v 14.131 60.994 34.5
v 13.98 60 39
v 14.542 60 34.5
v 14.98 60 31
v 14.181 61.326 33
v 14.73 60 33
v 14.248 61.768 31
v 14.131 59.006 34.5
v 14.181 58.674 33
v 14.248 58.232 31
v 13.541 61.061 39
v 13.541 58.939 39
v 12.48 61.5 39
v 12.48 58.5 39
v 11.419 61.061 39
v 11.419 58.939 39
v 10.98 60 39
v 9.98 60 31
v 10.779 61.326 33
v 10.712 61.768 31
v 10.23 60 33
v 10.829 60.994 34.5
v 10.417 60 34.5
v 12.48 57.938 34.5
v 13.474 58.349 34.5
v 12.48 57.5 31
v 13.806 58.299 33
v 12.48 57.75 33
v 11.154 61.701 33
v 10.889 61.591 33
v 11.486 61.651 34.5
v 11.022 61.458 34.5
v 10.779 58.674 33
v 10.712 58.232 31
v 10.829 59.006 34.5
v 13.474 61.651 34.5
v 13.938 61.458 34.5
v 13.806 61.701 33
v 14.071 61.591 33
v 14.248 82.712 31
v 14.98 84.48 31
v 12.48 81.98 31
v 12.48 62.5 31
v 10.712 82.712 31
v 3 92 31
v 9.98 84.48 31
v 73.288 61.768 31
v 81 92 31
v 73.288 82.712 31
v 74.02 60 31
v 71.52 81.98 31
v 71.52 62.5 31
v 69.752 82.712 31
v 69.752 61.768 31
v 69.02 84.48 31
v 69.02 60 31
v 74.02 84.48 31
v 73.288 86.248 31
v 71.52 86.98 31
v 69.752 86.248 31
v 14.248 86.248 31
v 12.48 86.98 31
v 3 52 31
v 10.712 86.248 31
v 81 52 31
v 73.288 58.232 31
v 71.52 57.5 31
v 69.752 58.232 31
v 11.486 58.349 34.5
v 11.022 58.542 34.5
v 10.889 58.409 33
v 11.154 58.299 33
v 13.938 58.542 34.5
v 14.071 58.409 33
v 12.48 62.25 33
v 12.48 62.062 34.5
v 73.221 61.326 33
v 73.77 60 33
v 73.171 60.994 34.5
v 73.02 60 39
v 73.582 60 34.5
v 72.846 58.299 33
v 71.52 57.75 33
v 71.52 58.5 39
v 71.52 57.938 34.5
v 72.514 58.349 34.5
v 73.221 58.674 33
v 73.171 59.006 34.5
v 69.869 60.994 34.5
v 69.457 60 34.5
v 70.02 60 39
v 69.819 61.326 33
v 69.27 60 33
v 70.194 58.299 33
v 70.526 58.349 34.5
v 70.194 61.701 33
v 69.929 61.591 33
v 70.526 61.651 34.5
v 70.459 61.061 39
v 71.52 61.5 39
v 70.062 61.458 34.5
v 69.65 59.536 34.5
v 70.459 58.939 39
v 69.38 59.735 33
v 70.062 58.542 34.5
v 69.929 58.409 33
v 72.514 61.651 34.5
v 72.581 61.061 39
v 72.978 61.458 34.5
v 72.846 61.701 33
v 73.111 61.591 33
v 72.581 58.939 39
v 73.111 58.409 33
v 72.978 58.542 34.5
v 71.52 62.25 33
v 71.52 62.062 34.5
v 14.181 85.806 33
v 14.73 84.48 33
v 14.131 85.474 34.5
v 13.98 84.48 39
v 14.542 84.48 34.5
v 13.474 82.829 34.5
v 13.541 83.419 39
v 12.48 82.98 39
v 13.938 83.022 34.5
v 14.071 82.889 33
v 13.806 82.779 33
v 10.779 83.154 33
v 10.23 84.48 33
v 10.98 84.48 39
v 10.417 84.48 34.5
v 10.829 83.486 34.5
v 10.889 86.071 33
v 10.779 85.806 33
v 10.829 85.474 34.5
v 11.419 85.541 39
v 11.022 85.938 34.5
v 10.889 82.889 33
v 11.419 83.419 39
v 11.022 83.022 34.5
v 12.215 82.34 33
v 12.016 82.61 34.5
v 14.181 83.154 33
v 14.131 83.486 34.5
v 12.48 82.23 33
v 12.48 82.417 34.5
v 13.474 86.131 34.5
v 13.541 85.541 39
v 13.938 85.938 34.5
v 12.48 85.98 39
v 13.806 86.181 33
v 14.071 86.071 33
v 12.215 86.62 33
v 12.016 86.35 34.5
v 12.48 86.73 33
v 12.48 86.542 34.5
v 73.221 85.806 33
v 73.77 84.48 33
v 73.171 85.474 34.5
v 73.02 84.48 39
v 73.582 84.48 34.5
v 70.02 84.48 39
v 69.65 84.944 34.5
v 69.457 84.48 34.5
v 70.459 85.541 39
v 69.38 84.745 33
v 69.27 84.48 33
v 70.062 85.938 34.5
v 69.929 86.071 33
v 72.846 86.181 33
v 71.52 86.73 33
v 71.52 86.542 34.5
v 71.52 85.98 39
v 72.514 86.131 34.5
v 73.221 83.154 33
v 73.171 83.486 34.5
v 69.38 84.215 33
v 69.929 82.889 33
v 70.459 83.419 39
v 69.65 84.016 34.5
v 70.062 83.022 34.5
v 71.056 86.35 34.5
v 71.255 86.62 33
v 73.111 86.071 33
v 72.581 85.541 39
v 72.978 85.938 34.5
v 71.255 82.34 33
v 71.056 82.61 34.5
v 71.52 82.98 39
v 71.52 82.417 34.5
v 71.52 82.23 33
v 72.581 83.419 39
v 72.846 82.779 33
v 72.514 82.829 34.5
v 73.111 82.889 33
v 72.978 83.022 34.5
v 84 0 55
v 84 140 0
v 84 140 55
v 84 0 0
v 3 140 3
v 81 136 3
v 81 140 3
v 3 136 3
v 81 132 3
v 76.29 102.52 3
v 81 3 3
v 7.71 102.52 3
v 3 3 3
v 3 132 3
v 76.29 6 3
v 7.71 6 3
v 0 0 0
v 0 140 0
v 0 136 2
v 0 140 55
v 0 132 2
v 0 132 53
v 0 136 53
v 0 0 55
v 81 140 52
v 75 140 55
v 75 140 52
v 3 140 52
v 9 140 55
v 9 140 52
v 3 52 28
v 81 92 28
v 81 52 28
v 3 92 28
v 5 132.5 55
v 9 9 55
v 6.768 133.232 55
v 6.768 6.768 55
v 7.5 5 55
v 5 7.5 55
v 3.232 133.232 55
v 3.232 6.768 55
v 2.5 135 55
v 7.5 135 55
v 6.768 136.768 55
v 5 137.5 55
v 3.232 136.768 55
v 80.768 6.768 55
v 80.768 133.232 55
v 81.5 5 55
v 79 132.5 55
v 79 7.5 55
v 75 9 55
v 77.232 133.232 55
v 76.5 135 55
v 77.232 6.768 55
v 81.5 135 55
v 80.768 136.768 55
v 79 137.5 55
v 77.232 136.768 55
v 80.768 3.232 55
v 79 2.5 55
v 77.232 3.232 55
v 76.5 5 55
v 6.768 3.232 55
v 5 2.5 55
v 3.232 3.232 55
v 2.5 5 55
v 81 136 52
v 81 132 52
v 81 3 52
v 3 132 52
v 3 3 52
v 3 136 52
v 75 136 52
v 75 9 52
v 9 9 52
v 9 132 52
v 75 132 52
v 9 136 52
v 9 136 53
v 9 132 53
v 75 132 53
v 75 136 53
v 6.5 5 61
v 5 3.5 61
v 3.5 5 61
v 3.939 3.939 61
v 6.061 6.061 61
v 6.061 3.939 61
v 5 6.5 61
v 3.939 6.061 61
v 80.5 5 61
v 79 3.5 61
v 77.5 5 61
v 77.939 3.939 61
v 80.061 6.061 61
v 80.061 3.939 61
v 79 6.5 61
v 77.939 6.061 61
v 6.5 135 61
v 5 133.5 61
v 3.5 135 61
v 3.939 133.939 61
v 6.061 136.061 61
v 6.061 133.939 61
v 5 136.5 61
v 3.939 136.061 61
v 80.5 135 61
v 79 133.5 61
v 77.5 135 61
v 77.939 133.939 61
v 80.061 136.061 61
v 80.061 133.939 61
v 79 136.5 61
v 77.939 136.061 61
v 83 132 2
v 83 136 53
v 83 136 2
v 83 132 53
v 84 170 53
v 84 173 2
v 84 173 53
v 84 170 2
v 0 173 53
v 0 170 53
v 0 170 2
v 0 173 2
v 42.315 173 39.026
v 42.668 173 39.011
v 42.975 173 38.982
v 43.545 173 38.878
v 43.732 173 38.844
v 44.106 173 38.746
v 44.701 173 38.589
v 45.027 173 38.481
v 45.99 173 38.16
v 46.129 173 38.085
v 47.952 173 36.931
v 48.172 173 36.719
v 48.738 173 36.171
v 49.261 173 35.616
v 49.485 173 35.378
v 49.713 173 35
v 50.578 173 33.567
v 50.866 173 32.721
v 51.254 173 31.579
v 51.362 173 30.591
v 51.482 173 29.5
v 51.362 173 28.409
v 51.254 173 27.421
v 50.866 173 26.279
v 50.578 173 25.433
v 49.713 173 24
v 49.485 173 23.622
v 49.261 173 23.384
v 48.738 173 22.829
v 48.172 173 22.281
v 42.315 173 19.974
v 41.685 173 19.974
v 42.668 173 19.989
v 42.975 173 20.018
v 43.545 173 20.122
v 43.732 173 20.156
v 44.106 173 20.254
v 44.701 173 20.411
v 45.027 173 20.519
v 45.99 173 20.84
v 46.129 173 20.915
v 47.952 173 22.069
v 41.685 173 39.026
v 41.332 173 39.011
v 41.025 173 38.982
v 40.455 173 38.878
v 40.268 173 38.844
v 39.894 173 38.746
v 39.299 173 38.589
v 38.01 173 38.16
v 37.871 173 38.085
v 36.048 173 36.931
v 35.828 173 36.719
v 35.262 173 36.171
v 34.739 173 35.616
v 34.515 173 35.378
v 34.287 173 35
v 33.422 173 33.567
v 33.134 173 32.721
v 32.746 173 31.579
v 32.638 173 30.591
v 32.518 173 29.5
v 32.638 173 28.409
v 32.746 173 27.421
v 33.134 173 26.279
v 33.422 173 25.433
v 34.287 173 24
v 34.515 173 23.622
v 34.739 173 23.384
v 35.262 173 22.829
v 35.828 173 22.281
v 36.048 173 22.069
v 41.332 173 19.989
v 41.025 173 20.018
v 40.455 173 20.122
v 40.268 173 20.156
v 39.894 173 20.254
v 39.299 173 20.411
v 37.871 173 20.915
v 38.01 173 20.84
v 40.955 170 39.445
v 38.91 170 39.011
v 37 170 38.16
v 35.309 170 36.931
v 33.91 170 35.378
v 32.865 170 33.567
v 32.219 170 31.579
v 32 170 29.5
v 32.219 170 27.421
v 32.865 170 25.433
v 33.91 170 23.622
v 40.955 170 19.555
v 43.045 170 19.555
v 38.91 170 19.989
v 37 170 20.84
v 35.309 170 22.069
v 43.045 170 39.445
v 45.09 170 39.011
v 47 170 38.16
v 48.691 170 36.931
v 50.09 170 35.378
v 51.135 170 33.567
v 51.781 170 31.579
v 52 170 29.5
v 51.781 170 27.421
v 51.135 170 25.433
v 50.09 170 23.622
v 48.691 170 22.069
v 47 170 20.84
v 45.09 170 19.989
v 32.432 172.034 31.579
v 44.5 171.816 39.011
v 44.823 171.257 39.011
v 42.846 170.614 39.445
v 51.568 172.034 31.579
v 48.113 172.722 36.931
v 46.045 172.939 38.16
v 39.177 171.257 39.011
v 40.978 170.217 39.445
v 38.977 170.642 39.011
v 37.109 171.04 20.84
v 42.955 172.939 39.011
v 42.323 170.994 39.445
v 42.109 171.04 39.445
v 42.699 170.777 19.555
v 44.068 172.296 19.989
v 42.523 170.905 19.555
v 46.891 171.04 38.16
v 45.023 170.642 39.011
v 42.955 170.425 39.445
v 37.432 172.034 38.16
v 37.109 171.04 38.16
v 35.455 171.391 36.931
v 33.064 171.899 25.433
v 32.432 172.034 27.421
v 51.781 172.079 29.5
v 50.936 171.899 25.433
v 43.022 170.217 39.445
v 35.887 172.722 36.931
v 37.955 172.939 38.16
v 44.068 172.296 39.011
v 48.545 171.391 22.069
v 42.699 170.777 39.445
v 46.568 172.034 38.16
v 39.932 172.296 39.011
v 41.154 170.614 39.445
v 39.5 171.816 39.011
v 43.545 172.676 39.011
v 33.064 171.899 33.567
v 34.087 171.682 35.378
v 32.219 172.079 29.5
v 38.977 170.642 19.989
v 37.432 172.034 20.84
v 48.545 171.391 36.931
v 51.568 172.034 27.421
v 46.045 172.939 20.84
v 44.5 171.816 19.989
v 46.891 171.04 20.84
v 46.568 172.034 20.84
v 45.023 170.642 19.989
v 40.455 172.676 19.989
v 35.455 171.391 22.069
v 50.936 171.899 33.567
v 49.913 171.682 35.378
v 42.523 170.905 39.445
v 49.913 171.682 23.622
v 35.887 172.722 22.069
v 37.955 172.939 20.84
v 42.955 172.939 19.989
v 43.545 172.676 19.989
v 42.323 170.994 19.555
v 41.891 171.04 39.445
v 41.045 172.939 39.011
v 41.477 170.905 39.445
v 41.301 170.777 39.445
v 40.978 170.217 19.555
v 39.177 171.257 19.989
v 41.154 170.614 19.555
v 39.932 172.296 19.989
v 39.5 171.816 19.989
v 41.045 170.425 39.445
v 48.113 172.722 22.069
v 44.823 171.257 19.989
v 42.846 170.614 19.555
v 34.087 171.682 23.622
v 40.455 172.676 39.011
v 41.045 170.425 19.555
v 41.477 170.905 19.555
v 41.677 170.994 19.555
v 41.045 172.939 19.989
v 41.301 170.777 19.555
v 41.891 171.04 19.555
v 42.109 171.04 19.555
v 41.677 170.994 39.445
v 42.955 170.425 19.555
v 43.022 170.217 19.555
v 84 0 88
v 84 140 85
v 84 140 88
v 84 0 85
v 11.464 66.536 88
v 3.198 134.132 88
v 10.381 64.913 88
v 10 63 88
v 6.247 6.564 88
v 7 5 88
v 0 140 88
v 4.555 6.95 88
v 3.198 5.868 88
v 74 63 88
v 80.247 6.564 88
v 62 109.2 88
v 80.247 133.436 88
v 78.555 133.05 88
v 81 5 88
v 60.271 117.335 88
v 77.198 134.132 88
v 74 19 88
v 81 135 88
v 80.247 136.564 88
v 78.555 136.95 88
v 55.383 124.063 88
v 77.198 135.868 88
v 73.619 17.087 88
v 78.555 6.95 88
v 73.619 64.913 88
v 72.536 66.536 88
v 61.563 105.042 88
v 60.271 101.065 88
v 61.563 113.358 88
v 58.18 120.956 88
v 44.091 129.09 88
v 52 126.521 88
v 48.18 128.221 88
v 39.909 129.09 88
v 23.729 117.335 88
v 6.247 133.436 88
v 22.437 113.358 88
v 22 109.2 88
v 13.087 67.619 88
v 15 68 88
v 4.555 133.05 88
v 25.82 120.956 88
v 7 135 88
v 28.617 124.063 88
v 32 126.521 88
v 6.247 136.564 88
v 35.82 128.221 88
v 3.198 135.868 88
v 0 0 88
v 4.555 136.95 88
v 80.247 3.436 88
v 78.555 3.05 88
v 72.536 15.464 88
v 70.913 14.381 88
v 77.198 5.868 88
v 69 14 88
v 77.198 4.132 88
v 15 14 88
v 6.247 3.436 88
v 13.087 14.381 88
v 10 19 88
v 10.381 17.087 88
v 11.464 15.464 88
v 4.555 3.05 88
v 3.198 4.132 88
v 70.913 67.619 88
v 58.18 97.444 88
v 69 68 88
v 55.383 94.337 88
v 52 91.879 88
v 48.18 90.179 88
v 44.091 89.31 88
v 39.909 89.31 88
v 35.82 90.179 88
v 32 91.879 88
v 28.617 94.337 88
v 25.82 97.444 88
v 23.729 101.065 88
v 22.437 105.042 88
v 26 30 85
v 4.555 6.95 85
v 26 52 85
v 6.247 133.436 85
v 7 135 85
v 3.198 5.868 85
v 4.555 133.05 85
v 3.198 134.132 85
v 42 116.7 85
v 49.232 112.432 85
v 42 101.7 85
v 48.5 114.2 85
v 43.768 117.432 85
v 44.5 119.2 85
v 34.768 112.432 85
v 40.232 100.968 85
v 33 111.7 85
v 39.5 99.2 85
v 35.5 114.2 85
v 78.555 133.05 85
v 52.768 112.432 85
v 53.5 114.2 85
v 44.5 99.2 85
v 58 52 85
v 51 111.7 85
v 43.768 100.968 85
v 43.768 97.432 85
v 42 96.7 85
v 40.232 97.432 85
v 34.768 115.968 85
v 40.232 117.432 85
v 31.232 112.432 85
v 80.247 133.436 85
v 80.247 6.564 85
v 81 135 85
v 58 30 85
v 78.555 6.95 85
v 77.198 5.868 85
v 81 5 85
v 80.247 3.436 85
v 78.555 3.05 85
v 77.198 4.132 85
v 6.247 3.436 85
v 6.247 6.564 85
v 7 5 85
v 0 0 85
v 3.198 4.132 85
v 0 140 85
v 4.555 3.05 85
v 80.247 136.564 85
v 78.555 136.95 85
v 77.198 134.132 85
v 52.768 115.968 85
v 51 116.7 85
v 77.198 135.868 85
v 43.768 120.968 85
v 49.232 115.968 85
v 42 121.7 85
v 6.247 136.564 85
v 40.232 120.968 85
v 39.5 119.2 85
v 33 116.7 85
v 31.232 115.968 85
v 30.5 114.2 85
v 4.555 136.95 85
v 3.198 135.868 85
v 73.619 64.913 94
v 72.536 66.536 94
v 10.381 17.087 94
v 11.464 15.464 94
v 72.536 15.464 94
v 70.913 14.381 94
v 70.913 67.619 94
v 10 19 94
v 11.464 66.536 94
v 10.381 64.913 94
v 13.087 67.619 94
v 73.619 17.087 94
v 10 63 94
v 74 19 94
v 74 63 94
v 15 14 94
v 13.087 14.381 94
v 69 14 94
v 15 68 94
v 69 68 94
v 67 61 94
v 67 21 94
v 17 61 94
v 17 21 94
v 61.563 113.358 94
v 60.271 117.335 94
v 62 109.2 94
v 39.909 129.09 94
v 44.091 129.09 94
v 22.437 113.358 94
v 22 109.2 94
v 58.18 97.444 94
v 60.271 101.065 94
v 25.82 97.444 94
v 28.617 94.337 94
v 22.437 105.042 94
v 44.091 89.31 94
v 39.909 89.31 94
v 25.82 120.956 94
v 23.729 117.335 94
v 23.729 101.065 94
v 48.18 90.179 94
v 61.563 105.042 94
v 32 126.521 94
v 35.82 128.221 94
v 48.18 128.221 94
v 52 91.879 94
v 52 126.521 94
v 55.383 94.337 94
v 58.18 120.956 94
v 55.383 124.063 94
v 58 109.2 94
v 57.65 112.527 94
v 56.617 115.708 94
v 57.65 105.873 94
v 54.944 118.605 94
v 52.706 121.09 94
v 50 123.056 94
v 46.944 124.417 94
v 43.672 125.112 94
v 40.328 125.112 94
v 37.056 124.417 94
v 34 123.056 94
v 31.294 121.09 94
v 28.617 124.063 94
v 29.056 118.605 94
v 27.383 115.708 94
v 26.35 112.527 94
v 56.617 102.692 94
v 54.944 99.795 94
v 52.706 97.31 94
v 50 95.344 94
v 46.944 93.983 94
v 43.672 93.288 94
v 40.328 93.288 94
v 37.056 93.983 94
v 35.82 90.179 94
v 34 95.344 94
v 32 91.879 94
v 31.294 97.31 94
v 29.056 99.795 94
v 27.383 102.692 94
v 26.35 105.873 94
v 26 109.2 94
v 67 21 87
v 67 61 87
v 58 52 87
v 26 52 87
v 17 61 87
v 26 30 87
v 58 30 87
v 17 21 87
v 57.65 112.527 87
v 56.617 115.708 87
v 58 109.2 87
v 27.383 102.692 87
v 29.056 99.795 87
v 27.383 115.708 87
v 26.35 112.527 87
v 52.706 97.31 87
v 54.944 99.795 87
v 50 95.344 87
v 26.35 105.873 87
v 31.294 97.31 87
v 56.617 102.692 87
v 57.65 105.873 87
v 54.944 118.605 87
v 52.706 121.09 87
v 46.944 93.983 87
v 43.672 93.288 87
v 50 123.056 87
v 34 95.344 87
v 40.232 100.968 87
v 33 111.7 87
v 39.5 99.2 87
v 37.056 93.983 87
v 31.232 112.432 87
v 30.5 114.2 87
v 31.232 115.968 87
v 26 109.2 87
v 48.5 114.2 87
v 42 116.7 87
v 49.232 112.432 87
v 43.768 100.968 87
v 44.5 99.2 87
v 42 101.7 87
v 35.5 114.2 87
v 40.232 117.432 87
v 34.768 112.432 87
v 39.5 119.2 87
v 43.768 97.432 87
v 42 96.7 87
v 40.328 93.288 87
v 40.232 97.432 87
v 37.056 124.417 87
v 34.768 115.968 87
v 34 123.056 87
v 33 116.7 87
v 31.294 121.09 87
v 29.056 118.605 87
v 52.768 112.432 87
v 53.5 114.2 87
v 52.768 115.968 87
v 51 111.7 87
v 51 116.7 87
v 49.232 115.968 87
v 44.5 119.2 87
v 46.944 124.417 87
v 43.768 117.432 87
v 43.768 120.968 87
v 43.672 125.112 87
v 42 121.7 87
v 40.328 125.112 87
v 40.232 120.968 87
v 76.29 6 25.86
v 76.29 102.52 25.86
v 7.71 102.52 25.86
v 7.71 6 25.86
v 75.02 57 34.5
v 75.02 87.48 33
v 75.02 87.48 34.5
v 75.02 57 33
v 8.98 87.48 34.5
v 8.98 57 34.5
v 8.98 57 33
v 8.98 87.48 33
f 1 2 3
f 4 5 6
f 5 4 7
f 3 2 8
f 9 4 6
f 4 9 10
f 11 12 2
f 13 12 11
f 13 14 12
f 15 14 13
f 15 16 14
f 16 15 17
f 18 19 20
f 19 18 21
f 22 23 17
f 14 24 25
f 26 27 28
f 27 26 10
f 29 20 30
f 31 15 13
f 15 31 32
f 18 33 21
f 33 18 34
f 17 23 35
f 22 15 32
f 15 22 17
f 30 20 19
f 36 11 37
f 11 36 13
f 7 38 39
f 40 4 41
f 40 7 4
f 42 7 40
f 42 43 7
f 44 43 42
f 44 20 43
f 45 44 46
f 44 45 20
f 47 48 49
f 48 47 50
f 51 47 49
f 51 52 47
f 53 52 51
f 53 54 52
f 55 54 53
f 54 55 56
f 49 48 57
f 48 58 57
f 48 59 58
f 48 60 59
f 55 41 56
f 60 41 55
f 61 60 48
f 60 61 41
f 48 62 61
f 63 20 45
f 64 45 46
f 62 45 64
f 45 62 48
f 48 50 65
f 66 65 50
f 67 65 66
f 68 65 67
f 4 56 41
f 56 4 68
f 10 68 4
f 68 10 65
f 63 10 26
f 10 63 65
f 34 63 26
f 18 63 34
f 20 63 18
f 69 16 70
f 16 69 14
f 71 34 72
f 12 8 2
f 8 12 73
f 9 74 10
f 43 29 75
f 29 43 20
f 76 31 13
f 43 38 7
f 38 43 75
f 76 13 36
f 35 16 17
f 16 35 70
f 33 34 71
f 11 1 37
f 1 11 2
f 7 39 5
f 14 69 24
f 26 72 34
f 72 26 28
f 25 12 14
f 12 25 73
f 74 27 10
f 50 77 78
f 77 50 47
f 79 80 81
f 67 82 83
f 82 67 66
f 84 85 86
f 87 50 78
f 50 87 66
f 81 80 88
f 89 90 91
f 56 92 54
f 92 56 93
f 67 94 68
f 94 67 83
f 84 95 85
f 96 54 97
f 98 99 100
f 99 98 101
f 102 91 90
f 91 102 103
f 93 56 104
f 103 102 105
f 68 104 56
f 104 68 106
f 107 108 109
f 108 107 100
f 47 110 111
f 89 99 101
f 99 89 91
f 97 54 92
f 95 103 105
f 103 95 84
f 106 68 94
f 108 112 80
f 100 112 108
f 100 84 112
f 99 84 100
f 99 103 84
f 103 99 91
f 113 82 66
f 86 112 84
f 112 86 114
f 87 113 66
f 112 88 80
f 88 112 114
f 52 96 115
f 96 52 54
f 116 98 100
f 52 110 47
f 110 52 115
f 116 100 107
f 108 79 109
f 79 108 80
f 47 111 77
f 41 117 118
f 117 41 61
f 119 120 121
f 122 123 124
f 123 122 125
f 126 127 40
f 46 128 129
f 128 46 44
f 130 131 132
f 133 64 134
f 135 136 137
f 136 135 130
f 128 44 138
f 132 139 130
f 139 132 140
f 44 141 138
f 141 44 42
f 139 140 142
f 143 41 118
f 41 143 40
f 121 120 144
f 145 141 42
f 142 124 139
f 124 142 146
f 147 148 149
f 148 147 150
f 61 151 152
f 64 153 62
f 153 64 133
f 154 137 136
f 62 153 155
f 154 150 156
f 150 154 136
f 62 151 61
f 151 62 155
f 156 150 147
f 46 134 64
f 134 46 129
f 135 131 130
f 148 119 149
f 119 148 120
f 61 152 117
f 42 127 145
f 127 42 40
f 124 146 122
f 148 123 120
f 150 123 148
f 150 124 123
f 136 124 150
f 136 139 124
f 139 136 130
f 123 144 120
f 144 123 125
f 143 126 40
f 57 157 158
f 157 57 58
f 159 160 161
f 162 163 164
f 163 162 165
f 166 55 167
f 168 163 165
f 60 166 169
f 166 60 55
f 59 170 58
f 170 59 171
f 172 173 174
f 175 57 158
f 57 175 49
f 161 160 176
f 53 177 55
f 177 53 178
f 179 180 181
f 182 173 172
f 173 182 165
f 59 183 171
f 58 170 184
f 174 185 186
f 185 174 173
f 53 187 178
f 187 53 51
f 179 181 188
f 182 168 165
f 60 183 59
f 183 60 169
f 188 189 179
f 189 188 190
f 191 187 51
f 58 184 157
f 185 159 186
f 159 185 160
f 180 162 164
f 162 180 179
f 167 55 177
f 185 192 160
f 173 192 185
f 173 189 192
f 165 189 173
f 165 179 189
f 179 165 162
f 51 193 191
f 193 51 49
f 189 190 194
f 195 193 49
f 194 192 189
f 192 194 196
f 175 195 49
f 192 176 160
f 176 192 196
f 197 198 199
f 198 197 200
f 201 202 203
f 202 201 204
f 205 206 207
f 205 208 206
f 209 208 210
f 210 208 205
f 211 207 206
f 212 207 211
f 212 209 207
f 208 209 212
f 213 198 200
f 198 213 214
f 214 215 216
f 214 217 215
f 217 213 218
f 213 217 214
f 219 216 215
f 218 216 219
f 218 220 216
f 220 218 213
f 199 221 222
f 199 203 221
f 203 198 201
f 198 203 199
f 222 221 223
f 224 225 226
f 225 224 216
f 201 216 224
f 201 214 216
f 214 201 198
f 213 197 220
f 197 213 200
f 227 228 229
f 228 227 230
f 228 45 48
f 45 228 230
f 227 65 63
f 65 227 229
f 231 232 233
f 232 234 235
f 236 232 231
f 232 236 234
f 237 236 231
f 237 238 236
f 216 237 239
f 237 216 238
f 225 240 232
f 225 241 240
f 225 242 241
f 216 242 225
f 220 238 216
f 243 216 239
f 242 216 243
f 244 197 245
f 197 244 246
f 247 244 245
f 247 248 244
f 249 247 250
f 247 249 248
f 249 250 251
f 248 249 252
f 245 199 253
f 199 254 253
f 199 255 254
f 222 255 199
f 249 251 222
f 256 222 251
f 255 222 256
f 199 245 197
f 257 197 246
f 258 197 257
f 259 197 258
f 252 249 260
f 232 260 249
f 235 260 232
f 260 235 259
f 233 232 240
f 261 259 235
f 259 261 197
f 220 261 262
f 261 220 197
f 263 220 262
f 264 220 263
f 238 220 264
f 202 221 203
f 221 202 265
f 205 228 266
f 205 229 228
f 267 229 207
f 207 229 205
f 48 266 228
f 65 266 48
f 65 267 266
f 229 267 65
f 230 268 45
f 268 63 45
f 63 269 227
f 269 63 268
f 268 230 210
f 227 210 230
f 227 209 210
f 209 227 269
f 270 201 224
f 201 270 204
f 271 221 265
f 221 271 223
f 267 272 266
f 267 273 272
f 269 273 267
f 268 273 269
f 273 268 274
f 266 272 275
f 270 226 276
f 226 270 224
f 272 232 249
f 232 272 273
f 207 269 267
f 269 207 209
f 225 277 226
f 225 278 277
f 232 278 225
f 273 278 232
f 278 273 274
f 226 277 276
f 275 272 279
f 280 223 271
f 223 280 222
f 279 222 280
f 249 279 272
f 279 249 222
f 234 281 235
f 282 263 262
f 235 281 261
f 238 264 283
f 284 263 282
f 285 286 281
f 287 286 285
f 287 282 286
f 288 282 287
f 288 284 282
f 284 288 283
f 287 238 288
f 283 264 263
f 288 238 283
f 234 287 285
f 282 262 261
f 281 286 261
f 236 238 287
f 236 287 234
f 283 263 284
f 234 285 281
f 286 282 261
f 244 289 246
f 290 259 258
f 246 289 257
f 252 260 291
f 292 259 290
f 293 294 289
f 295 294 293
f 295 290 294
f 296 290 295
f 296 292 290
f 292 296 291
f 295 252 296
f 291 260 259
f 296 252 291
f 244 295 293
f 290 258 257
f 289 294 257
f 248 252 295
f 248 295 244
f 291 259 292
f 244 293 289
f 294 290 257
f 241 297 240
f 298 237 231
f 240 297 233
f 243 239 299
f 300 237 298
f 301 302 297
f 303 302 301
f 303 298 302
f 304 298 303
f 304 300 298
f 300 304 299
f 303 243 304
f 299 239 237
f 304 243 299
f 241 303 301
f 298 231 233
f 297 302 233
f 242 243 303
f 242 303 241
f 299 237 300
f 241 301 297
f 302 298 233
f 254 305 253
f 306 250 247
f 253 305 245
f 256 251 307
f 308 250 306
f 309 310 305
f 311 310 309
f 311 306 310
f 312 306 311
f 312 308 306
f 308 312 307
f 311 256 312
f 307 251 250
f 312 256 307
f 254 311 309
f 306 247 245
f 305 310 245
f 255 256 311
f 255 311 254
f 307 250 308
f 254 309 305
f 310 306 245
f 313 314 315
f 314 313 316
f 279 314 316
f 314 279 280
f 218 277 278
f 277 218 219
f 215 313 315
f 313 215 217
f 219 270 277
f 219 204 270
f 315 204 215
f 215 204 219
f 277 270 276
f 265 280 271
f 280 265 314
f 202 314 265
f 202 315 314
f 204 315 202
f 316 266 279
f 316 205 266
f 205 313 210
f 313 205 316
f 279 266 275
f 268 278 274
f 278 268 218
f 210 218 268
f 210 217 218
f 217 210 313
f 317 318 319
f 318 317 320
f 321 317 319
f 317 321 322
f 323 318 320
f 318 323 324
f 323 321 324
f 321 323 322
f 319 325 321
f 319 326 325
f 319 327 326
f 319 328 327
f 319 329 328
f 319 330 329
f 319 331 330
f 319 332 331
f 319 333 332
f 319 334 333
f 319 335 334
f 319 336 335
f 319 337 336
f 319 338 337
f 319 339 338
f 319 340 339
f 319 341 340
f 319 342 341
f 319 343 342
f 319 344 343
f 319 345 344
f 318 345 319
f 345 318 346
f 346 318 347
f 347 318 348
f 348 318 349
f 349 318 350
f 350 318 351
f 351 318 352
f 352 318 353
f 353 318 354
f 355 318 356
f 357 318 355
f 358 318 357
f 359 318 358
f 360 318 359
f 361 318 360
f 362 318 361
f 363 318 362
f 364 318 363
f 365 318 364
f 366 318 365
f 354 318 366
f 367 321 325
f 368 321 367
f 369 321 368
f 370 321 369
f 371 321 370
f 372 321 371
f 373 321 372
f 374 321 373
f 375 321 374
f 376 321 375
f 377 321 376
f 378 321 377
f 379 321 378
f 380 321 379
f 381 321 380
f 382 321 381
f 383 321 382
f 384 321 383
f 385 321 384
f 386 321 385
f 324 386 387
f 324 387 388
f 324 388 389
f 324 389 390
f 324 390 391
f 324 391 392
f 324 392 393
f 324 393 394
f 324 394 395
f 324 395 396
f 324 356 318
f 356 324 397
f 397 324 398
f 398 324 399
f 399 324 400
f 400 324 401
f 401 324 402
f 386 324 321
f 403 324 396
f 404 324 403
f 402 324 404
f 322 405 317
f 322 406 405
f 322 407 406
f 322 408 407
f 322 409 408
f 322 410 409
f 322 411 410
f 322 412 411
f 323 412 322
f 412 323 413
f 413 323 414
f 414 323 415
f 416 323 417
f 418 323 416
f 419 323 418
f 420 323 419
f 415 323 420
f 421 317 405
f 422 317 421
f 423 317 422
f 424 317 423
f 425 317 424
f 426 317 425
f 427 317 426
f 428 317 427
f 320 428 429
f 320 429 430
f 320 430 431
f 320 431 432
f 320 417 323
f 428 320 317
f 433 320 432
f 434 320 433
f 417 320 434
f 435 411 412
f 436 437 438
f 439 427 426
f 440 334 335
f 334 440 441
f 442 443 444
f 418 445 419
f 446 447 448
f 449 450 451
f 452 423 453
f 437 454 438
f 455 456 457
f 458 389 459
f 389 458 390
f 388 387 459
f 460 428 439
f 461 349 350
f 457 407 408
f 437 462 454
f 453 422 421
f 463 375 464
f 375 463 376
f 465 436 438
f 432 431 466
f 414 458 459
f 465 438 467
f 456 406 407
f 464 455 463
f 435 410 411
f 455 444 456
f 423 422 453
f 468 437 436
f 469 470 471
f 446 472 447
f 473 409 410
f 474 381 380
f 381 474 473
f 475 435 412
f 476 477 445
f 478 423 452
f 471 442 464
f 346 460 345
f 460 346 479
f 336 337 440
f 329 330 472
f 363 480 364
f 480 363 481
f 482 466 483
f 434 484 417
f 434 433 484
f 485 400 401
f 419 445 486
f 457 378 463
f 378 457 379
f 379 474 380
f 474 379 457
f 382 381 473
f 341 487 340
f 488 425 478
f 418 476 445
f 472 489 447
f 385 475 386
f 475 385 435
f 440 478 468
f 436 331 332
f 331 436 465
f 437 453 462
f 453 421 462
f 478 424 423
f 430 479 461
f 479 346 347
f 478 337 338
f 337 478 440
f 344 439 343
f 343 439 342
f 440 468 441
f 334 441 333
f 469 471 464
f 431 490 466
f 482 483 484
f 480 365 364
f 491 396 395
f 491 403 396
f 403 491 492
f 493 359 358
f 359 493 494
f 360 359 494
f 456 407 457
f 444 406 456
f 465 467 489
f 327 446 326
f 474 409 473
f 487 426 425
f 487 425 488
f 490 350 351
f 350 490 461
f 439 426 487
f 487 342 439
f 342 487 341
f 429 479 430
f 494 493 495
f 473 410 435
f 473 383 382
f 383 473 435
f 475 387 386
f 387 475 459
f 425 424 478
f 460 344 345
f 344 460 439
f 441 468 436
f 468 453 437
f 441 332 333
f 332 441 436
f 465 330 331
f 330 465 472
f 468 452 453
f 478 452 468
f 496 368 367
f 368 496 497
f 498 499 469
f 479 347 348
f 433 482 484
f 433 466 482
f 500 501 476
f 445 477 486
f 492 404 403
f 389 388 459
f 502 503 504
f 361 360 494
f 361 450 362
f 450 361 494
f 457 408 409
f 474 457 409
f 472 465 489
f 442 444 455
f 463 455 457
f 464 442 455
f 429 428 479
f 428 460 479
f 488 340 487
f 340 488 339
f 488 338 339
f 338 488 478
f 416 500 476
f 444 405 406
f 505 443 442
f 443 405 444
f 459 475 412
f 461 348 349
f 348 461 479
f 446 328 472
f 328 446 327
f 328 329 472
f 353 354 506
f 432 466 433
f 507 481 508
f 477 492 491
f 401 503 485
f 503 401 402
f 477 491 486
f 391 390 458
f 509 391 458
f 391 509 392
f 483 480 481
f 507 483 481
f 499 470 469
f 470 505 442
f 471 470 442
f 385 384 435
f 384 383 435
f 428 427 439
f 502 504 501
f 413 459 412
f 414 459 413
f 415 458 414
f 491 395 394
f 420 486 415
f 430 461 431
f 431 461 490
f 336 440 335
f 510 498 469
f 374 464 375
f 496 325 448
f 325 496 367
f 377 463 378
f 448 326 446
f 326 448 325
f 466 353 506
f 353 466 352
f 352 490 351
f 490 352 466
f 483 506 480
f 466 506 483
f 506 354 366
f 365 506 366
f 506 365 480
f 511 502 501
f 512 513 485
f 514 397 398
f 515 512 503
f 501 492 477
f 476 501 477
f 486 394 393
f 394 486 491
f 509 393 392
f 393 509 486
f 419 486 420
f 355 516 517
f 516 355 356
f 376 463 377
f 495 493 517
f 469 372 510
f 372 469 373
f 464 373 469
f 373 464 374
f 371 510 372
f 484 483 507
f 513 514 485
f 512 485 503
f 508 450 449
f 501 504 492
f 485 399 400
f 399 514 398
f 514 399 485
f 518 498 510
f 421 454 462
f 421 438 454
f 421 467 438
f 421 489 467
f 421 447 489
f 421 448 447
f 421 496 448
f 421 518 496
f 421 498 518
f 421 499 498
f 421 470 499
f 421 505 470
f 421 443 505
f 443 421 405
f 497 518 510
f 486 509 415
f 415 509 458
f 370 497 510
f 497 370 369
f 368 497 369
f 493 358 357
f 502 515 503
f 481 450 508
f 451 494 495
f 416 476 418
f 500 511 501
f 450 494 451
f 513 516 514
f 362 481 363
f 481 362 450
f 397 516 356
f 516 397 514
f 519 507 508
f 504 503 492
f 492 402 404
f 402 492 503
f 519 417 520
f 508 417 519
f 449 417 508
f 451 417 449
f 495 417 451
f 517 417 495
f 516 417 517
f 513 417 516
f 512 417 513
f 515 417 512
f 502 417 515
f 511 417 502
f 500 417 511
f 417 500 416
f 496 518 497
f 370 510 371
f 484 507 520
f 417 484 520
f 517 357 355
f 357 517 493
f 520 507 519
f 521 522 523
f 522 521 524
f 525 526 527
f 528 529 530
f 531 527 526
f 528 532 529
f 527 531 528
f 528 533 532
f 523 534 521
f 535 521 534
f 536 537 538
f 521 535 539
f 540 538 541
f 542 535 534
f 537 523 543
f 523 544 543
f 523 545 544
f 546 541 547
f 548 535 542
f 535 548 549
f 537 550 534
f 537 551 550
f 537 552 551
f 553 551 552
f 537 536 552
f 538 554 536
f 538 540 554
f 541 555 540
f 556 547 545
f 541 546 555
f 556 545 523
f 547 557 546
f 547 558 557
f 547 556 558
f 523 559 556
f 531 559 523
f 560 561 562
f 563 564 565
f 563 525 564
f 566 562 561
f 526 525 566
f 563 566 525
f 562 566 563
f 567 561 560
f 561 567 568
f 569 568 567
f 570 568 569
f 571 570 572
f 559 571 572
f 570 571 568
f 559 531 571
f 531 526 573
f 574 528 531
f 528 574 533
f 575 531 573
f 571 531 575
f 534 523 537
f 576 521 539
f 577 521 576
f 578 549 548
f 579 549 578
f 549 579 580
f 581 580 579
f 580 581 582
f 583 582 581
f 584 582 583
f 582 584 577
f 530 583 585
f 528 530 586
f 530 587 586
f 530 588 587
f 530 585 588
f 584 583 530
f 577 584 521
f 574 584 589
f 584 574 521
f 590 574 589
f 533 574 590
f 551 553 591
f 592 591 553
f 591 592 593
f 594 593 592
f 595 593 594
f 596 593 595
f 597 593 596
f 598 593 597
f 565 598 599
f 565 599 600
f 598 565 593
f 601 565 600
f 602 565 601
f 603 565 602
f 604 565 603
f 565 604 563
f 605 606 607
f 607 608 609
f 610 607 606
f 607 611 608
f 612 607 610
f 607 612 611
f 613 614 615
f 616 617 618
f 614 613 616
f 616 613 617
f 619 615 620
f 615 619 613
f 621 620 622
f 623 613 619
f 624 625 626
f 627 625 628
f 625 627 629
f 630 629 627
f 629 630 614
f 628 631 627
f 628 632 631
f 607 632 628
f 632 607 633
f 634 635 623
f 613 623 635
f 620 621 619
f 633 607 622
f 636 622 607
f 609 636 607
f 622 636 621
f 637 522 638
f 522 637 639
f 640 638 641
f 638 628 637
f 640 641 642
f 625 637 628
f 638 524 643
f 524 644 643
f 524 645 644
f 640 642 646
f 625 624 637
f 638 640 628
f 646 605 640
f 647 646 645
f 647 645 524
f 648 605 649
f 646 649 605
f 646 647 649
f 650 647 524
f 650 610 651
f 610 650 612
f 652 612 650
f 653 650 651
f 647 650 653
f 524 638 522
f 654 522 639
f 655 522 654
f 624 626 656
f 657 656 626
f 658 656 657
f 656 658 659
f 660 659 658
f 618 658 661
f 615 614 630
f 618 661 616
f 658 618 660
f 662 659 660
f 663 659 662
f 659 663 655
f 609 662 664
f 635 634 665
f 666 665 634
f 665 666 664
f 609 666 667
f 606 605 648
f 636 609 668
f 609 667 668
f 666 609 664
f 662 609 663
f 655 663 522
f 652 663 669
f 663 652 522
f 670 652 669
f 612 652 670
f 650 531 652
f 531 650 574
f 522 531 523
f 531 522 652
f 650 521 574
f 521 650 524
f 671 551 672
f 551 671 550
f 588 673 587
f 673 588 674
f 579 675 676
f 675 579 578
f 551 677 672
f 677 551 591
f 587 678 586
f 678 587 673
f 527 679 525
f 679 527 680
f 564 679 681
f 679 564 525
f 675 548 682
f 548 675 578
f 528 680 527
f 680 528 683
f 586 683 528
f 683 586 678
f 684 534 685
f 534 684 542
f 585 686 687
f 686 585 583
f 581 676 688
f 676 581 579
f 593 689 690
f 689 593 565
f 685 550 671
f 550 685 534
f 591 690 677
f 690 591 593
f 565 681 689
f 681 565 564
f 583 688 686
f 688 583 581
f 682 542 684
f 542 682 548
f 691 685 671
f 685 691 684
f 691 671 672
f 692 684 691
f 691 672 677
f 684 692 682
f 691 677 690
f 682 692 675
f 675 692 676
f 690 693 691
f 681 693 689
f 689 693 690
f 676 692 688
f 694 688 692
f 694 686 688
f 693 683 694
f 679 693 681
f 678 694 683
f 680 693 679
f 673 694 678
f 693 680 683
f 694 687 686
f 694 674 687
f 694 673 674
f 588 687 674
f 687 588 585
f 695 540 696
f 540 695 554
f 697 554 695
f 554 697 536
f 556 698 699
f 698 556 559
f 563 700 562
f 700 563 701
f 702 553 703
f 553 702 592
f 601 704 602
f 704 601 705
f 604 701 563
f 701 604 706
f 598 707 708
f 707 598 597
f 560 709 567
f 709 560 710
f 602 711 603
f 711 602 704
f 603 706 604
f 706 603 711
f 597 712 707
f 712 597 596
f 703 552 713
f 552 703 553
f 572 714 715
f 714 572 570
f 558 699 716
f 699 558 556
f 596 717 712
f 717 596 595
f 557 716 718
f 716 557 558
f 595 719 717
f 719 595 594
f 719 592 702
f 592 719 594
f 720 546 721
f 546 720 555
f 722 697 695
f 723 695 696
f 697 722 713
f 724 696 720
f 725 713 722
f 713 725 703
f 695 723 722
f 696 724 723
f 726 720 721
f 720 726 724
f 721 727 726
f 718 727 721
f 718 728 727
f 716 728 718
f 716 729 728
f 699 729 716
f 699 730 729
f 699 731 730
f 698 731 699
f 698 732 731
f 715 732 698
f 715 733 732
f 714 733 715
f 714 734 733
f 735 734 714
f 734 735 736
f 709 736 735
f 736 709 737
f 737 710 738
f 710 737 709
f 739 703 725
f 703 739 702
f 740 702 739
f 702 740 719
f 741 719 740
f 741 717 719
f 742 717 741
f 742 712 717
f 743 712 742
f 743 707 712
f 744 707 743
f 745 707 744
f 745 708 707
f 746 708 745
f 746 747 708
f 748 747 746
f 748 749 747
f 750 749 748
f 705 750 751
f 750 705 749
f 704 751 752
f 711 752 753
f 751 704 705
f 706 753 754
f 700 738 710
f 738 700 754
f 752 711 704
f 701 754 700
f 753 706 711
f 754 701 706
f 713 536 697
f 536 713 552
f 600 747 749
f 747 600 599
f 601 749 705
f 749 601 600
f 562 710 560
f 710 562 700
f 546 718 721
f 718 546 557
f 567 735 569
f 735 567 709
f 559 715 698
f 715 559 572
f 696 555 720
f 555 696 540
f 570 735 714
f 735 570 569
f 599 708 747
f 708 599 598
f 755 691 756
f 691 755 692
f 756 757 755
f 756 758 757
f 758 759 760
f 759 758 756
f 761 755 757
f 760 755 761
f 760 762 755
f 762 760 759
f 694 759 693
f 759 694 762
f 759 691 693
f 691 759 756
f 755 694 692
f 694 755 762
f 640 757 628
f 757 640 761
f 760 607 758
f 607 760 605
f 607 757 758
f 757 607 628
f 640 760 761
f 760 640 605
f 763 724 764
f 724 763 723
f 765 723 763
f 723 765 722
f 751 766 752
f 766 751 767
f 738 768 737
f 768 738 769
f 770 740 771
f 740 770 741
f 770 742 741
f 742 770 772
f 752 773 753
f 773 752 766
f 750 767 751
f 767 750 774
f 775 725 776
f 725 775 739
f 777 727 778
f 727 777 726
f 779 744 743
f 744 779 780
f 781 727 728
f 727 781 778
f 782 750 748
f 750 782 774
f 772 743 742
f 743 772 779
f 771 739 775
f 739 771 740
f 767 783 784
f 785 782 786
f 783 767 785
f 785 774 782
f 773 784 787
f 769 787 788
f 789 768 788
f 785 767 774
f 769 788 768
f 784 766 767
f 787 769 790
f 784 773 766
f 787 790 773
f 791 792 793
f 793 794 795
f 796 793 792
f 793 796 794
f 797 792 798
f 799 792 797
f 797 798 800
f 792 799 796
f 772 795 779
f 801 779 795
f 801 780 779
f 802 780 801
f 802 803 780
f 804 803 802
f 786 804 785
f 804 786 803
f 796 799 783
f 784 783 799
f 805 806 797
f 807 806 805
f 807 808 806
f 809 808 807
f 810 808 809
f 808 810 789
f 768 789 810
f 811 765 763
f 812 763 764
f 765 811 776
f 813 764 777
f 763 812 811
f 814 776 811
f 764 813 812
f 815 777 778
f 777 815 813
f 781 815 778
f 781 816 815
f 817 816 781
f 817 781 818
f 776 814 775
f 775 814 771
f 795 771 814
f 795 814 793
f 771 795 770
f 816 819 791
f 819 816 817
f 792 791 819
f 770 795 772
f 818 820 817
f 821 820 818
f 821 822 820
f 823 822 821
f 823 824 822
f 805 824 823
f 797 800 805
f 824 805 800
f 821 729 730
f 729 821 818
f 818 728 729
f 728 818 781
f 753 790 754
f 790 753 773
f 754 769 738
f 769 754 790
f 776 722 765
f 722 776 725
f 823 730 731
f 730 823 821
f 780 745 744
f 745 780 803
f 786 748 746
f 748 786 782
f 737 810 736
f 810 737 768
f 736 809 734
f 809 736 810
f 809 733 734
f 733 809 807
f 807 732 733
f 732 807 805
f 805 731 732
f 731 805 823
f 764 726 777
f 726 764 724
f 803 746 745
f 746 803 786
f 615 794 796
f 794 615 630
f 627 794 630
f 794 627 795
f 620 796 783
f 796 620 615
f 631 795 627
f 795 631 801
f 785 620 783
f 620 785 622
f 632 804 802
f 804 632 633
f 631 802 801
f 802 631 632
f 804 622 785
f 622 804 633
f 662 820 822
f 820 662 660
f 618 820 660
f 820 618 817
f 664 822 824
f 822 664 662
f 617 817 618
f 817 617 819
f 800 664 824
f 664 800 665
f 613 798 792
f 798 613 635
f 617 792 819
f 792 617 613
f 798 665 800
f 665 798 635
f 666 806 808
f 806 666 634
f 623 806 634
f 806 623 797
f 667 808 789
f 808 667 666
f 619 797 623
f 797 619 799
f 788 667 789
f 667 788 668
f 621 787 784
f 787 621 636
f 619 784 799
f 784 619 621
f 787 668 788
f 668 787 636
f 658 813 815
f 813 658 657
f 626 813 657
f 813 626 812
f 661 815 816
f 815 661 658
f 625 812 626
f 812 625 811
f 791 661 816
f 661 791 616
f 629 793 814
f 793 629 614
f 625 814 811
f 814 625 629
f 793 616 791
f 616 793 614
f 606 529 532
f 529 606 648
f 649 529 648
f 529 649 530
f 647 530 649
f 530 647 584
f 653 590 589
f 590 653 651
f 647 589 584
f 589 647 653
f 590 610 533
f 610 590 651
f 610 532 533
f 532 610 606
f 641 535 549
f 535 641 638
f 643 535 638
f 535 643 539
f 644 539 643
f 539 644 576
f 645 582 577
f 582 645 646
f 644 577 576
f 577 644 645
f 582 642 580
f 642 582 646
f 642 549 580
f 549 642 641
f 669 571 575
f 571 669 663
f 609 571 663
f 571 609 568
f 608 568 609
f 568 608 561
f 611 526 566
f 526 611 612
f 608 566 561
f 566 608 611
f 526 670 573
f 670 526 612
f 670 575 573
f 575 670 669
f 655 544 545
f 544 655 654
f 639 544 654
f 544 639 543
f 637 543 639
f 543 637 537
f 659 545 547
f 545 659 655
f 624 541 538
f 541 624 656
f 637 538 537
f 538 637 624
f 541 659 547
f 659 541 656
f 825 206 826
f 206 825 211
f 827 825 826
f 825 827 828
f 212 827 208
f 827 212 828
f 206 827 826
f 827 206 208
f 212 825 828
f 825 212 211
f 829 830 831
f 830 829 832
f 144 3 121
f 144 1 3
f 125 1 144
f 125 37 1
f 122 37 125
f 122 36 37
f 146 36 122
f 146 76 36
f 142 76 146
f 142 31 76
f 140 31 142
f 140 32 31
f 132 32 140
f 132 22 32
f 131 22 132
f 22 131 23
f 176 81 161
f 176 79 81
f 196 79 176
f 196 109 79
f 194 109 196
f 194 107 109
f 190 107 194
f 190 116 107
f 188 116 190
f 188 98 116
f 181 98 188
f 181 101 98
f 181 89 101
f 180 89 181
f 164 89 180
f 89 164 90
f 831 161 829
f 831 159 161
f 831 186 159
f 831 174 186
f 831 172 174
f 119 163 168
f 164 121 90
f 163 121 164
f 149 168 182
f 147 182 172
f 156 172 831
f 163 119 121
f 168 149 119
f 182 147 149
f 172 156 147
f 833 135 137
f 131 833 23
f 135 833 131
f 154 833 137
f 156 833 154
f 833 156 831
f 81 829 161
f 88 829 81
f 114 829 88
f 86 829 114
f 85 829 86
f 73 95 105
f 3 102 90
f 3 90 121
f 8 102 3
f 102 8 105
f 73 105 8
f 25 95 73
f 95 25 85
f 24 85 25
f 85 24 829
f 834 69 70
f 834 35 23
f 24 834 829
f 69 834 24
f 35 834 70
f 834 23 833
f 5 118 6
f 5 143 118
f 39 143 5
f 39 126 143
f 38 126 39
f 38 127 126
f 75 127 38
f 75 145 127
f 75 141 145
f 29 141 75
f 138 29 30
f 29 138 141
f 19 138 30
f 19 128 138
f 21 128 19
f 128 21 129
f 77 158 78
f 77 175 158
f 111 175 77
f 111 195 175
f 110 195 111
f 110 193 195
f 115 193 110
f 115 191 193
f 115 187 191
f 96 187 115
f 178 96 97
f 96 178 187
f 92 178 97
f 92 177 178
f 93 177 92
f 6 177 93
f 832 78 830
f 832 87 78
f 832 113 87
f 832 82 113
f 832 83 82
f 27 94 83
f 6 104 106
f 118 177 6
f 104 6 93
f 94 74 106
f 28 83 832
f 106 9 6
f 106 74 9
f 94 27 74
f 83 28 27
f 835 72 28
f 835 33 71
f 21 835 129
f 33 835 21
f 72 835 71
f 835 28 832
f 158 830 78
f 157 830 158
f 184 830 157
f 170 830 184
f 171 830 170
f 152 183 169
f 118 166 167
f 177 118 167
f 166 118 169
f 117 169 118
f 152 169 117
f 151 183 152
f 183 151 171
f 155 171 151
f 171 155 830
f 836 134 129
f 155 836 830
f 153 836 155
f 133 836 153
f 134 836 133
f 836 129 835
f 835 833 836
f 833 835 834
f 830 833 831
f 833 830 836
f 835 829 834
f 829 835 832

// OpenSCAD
// Ansible widget cases

PI_W = 66.04;
PI_L = 30.48;
PI_D = 1.5;

LID_GROOVE_WIDTH = 2;

module pi_connectors() {    
    x_offset = 3.5;
    y_offset = 3;

    h = 8;
    r1 = 2.5;
    r2 = 1.5;

    translate([x_offset, y_offset, 0])
        cylinder(h, r1, r2);
    translate([PI_W - x_offset, y_offset, 0])
        cylinder(h, r1, r2);
    translate([x_offset, PI_L - y_offset, 0])
        cylinder(h, r1, r2);
    translate([PI_W - x_offset, PI_L - y_offset, 0])
        cylinder(h, r1, r2);
}

module case(width, length, wall_thickness, shelf_y, shelf_length, shelf_height, divider_y, case_height, widget_dock_height, pi_y, groove_width, ridge_thickness) {
    
    difference() {
    union() {
        // Floor
        difference() {
            cube([width, length, wall_thickness]);
        }
        
        // Pi shelf
        translate([0, shelf_y, shelf_height])
            cube([width, shelf_length, wall_thickness]);
        translate([width / 2 - PI_W / 2, pi_y, shelf_height + wall_thickness])
            pi_connectors();
        
        // Side walls
        difference() {
            // Wall
            translate([width - wall_thickness, 0, 0])
                cube([wall_thickness, length, case_height]);
        }
        
        difference() {
            // Wall
            translate([0, 0, 0])
                cube([wall_thickness, length, case_height]);
        }
       
        // Ridges
        // Back ridge
        translate([0, wall_thickness, case_height - wall_thickness])
            cube([width, ridge_thickness,wall_thickness]);
        // Side ridges
        translate([wall_thickness, wall_thickness, case_height - wall_thickness])
            cube([ridge_thickness, length - wall_thickness, wall_thickness]);
        translate([width - ridge_thickness - wall_thickness, wall_thickness, case_height - wall_thickness])
            cube([ridge_thickness, length - wall_thickness, wall_thickness]);

        // Ridge connectors
        h = 6;
        r1 = 2.5;
        r2 = 1.5;
        ridge_offset = 5;
        translate([ridge_offset, ridge_offset, case_height])
            cylinder(h, r1, r2);
        translate([width - ridge_offset, ridge_offset, case_height])
            cylinder(h, r1, r2);
        translate([ridge_offset, length - ridge_offset, case_height])
            cylinder(h, r1, r2);
        translate([width - ridge_offset, length - ridge_offset, case_height])
            cylinder(h, r1, r2);

        // Back wall
        cube([width, wall_thickness, case_height]);
    }
        
    // Door slot
    translate([-1, length - wall_thickness - 5, wall_thickness - 1])
        cube([width, 4, case_height - wall_thickness - 1]);
    }
    
    // Door (length - 7)
    translate([0, length + 30, wall_thickness - 1])
    union() {
        difference() {
            cube([width, 3, case_height - wall_thickness * 2 + 2]);
            
            translate([width / 2, 0, case_height / 2])
            sphere(10);
        }
    }
    
    // Lid
    selection_y = length * 0.78;
    widget_y = length * 0.15;
    widget_w = 50;
    widget_l = 40;
    border_height = 9;
    border_thickness = 4;
    selection_dock_r = 16;
    
//    translate([width + 10, 0, case_height])
    translate([0, 0, case_height + 30])
        difference() {
            union() {
                // Lid
                cube([width, length, wall_thickness]);
                
                // Widget dock border
                translate([width / 2 - widget_w / 2, widget_y, 0])
                linear_extrude(height=border_height)
                hull() {
                    translate([-border_thickness / 2, -border_thickness / 2, 0])
                        circle(r=5);
                
                    translate([widget_w + border_thickness / 2, -border_thickness / 2, 0])
                        circle(r=5);
                
                    translate([-border_thickness / 2, widget_l + border_thickness / 2, 0])
                        circle(r=5);
                
                    translate([widget_w + border_thickness / 2, widget_l + border_thickness / 2, 0])
                        circle(r=5);
                }
            
                // Selection dock border
                translate([width / 2, selection_y, 0])
                    linear_extrude(height=border_height)
                    circle(r=selection_dock_r + border_thickness);
            }
           
            // Widget dock
            translate([width / 2 - widget_w / 2, widget_y, 2])
            cube([widget_w, widget_l, border_height + 1]);
            
            // Widget dock hole
            widget_offset = 18;
            widget_hole_w = widget_w - widget_offset;
            widget_hole_l = widget_l - widget_offset;
            translate([width / 2 - widget_hole_w / 2, widget_y + widget_offset / 2, -5])
                cube([widget_hole_w, widget_hole_l, 10]);
            
            // Selection dock
            translate([width / 2, selection_y, 2])
            linear_extrude(height=border_height + 1)
                circle(r=selection_dock_r);
            
            // Selection dock holes
            offset = selection_dock_r - 6;
            
            translate([width / 2, selection_y - offset, -5])
            cylinder(10, 2.5, 2.5);
            
            translate([width / 2, selection_y + offset, -5])
            cylinder(10, 2.5, 2.5);
            
            horiz_offset = 9;
            y_offset = 5;
            translate([width / 2 - horiz_offset, selection_y + y_offset, -5])
            cylinder(10, 2.5, 2.5);
                
            translate([width / 2 + horiz_offset, selection_y + y_offset, -5])
            cylinder(10, 2.5, 2.5);
                
            // Ridge connectors
            h = 10;
            r = 2;
            ridge_offset = 5;
            translate([ridge_offset, ridge_offset, -5])
                cylinder(h, r, r);
            translate([width - ridge_offset, ridge_offset, -5])
                cylinder(h, r, r);
            translate([ridge_offset, length - ridge_offset, -5])
                cylinder(h, r, r);
            translate([width - ridge_offset, length - ridge_offset, -5])
                cylinder(h, r, r);
        }
}

shelf_height = 28;
wall_thickness = 3;

module default_case() {
    WIDTH = 84;
    LENGTH = 140;
    SHELF_Y = 52;
    SHELF_LENGTH = 40;
    SHELF_HEIGHT = 28;
    WALL_THICKNESS = 3;
    DIVIDER_Y = 65;
    CASE_HEIGHT = 55;
    WIDGET_DOCK_HEIGHT = CASE_HEIGHT;
    PI_Y = DIVIDER_Y - 8;
    GROOVE_WIDTH = LID_GROOVE_WIDTH + 1;
    RIDGE_THICKNESS = 6;

    case(
        width=WIDTH,
        length=LENGTH,
        shelf_y=SHELF_Y,
        shelf_length=SHELF_LENGTH,
        shelf_height=SHELF_HEIGHT,  
        wall_thickness=WALL_THICKNESS,
        divider_y=DIVIDER_Y,
        case_height=CASE_HEIGHT,
        widget_dock_height=WIDGET_DOCK_HEIGHT,
        pi_y=PI_Y,
        groove_width=GROOVE_WIDTH,
        ridge_thickness=RIDGE_THICKNESS
    );
}

default_case();

module pack_and_pi() {
    CASE_WIDTH = 84;
    DIVIDER_Y = 65;
    
    // Battery pack
    color("red") {
        translate([CASE_WIDTH / 2 - 68.58 / 2, wall_thickness * 2, wall_thickness])
        cube([68.58, 96.52, 22.86]);
    }

    // Pi
    color("blue") {
        translate([CASE_WIDTH / 2 - PI_W / 2, DIVIDER_Y - 8, shelf_height + wall_thickness + 2])
            cube([PI_W, PI_L, PI_D]);
    }
}

pack_and_pi();
